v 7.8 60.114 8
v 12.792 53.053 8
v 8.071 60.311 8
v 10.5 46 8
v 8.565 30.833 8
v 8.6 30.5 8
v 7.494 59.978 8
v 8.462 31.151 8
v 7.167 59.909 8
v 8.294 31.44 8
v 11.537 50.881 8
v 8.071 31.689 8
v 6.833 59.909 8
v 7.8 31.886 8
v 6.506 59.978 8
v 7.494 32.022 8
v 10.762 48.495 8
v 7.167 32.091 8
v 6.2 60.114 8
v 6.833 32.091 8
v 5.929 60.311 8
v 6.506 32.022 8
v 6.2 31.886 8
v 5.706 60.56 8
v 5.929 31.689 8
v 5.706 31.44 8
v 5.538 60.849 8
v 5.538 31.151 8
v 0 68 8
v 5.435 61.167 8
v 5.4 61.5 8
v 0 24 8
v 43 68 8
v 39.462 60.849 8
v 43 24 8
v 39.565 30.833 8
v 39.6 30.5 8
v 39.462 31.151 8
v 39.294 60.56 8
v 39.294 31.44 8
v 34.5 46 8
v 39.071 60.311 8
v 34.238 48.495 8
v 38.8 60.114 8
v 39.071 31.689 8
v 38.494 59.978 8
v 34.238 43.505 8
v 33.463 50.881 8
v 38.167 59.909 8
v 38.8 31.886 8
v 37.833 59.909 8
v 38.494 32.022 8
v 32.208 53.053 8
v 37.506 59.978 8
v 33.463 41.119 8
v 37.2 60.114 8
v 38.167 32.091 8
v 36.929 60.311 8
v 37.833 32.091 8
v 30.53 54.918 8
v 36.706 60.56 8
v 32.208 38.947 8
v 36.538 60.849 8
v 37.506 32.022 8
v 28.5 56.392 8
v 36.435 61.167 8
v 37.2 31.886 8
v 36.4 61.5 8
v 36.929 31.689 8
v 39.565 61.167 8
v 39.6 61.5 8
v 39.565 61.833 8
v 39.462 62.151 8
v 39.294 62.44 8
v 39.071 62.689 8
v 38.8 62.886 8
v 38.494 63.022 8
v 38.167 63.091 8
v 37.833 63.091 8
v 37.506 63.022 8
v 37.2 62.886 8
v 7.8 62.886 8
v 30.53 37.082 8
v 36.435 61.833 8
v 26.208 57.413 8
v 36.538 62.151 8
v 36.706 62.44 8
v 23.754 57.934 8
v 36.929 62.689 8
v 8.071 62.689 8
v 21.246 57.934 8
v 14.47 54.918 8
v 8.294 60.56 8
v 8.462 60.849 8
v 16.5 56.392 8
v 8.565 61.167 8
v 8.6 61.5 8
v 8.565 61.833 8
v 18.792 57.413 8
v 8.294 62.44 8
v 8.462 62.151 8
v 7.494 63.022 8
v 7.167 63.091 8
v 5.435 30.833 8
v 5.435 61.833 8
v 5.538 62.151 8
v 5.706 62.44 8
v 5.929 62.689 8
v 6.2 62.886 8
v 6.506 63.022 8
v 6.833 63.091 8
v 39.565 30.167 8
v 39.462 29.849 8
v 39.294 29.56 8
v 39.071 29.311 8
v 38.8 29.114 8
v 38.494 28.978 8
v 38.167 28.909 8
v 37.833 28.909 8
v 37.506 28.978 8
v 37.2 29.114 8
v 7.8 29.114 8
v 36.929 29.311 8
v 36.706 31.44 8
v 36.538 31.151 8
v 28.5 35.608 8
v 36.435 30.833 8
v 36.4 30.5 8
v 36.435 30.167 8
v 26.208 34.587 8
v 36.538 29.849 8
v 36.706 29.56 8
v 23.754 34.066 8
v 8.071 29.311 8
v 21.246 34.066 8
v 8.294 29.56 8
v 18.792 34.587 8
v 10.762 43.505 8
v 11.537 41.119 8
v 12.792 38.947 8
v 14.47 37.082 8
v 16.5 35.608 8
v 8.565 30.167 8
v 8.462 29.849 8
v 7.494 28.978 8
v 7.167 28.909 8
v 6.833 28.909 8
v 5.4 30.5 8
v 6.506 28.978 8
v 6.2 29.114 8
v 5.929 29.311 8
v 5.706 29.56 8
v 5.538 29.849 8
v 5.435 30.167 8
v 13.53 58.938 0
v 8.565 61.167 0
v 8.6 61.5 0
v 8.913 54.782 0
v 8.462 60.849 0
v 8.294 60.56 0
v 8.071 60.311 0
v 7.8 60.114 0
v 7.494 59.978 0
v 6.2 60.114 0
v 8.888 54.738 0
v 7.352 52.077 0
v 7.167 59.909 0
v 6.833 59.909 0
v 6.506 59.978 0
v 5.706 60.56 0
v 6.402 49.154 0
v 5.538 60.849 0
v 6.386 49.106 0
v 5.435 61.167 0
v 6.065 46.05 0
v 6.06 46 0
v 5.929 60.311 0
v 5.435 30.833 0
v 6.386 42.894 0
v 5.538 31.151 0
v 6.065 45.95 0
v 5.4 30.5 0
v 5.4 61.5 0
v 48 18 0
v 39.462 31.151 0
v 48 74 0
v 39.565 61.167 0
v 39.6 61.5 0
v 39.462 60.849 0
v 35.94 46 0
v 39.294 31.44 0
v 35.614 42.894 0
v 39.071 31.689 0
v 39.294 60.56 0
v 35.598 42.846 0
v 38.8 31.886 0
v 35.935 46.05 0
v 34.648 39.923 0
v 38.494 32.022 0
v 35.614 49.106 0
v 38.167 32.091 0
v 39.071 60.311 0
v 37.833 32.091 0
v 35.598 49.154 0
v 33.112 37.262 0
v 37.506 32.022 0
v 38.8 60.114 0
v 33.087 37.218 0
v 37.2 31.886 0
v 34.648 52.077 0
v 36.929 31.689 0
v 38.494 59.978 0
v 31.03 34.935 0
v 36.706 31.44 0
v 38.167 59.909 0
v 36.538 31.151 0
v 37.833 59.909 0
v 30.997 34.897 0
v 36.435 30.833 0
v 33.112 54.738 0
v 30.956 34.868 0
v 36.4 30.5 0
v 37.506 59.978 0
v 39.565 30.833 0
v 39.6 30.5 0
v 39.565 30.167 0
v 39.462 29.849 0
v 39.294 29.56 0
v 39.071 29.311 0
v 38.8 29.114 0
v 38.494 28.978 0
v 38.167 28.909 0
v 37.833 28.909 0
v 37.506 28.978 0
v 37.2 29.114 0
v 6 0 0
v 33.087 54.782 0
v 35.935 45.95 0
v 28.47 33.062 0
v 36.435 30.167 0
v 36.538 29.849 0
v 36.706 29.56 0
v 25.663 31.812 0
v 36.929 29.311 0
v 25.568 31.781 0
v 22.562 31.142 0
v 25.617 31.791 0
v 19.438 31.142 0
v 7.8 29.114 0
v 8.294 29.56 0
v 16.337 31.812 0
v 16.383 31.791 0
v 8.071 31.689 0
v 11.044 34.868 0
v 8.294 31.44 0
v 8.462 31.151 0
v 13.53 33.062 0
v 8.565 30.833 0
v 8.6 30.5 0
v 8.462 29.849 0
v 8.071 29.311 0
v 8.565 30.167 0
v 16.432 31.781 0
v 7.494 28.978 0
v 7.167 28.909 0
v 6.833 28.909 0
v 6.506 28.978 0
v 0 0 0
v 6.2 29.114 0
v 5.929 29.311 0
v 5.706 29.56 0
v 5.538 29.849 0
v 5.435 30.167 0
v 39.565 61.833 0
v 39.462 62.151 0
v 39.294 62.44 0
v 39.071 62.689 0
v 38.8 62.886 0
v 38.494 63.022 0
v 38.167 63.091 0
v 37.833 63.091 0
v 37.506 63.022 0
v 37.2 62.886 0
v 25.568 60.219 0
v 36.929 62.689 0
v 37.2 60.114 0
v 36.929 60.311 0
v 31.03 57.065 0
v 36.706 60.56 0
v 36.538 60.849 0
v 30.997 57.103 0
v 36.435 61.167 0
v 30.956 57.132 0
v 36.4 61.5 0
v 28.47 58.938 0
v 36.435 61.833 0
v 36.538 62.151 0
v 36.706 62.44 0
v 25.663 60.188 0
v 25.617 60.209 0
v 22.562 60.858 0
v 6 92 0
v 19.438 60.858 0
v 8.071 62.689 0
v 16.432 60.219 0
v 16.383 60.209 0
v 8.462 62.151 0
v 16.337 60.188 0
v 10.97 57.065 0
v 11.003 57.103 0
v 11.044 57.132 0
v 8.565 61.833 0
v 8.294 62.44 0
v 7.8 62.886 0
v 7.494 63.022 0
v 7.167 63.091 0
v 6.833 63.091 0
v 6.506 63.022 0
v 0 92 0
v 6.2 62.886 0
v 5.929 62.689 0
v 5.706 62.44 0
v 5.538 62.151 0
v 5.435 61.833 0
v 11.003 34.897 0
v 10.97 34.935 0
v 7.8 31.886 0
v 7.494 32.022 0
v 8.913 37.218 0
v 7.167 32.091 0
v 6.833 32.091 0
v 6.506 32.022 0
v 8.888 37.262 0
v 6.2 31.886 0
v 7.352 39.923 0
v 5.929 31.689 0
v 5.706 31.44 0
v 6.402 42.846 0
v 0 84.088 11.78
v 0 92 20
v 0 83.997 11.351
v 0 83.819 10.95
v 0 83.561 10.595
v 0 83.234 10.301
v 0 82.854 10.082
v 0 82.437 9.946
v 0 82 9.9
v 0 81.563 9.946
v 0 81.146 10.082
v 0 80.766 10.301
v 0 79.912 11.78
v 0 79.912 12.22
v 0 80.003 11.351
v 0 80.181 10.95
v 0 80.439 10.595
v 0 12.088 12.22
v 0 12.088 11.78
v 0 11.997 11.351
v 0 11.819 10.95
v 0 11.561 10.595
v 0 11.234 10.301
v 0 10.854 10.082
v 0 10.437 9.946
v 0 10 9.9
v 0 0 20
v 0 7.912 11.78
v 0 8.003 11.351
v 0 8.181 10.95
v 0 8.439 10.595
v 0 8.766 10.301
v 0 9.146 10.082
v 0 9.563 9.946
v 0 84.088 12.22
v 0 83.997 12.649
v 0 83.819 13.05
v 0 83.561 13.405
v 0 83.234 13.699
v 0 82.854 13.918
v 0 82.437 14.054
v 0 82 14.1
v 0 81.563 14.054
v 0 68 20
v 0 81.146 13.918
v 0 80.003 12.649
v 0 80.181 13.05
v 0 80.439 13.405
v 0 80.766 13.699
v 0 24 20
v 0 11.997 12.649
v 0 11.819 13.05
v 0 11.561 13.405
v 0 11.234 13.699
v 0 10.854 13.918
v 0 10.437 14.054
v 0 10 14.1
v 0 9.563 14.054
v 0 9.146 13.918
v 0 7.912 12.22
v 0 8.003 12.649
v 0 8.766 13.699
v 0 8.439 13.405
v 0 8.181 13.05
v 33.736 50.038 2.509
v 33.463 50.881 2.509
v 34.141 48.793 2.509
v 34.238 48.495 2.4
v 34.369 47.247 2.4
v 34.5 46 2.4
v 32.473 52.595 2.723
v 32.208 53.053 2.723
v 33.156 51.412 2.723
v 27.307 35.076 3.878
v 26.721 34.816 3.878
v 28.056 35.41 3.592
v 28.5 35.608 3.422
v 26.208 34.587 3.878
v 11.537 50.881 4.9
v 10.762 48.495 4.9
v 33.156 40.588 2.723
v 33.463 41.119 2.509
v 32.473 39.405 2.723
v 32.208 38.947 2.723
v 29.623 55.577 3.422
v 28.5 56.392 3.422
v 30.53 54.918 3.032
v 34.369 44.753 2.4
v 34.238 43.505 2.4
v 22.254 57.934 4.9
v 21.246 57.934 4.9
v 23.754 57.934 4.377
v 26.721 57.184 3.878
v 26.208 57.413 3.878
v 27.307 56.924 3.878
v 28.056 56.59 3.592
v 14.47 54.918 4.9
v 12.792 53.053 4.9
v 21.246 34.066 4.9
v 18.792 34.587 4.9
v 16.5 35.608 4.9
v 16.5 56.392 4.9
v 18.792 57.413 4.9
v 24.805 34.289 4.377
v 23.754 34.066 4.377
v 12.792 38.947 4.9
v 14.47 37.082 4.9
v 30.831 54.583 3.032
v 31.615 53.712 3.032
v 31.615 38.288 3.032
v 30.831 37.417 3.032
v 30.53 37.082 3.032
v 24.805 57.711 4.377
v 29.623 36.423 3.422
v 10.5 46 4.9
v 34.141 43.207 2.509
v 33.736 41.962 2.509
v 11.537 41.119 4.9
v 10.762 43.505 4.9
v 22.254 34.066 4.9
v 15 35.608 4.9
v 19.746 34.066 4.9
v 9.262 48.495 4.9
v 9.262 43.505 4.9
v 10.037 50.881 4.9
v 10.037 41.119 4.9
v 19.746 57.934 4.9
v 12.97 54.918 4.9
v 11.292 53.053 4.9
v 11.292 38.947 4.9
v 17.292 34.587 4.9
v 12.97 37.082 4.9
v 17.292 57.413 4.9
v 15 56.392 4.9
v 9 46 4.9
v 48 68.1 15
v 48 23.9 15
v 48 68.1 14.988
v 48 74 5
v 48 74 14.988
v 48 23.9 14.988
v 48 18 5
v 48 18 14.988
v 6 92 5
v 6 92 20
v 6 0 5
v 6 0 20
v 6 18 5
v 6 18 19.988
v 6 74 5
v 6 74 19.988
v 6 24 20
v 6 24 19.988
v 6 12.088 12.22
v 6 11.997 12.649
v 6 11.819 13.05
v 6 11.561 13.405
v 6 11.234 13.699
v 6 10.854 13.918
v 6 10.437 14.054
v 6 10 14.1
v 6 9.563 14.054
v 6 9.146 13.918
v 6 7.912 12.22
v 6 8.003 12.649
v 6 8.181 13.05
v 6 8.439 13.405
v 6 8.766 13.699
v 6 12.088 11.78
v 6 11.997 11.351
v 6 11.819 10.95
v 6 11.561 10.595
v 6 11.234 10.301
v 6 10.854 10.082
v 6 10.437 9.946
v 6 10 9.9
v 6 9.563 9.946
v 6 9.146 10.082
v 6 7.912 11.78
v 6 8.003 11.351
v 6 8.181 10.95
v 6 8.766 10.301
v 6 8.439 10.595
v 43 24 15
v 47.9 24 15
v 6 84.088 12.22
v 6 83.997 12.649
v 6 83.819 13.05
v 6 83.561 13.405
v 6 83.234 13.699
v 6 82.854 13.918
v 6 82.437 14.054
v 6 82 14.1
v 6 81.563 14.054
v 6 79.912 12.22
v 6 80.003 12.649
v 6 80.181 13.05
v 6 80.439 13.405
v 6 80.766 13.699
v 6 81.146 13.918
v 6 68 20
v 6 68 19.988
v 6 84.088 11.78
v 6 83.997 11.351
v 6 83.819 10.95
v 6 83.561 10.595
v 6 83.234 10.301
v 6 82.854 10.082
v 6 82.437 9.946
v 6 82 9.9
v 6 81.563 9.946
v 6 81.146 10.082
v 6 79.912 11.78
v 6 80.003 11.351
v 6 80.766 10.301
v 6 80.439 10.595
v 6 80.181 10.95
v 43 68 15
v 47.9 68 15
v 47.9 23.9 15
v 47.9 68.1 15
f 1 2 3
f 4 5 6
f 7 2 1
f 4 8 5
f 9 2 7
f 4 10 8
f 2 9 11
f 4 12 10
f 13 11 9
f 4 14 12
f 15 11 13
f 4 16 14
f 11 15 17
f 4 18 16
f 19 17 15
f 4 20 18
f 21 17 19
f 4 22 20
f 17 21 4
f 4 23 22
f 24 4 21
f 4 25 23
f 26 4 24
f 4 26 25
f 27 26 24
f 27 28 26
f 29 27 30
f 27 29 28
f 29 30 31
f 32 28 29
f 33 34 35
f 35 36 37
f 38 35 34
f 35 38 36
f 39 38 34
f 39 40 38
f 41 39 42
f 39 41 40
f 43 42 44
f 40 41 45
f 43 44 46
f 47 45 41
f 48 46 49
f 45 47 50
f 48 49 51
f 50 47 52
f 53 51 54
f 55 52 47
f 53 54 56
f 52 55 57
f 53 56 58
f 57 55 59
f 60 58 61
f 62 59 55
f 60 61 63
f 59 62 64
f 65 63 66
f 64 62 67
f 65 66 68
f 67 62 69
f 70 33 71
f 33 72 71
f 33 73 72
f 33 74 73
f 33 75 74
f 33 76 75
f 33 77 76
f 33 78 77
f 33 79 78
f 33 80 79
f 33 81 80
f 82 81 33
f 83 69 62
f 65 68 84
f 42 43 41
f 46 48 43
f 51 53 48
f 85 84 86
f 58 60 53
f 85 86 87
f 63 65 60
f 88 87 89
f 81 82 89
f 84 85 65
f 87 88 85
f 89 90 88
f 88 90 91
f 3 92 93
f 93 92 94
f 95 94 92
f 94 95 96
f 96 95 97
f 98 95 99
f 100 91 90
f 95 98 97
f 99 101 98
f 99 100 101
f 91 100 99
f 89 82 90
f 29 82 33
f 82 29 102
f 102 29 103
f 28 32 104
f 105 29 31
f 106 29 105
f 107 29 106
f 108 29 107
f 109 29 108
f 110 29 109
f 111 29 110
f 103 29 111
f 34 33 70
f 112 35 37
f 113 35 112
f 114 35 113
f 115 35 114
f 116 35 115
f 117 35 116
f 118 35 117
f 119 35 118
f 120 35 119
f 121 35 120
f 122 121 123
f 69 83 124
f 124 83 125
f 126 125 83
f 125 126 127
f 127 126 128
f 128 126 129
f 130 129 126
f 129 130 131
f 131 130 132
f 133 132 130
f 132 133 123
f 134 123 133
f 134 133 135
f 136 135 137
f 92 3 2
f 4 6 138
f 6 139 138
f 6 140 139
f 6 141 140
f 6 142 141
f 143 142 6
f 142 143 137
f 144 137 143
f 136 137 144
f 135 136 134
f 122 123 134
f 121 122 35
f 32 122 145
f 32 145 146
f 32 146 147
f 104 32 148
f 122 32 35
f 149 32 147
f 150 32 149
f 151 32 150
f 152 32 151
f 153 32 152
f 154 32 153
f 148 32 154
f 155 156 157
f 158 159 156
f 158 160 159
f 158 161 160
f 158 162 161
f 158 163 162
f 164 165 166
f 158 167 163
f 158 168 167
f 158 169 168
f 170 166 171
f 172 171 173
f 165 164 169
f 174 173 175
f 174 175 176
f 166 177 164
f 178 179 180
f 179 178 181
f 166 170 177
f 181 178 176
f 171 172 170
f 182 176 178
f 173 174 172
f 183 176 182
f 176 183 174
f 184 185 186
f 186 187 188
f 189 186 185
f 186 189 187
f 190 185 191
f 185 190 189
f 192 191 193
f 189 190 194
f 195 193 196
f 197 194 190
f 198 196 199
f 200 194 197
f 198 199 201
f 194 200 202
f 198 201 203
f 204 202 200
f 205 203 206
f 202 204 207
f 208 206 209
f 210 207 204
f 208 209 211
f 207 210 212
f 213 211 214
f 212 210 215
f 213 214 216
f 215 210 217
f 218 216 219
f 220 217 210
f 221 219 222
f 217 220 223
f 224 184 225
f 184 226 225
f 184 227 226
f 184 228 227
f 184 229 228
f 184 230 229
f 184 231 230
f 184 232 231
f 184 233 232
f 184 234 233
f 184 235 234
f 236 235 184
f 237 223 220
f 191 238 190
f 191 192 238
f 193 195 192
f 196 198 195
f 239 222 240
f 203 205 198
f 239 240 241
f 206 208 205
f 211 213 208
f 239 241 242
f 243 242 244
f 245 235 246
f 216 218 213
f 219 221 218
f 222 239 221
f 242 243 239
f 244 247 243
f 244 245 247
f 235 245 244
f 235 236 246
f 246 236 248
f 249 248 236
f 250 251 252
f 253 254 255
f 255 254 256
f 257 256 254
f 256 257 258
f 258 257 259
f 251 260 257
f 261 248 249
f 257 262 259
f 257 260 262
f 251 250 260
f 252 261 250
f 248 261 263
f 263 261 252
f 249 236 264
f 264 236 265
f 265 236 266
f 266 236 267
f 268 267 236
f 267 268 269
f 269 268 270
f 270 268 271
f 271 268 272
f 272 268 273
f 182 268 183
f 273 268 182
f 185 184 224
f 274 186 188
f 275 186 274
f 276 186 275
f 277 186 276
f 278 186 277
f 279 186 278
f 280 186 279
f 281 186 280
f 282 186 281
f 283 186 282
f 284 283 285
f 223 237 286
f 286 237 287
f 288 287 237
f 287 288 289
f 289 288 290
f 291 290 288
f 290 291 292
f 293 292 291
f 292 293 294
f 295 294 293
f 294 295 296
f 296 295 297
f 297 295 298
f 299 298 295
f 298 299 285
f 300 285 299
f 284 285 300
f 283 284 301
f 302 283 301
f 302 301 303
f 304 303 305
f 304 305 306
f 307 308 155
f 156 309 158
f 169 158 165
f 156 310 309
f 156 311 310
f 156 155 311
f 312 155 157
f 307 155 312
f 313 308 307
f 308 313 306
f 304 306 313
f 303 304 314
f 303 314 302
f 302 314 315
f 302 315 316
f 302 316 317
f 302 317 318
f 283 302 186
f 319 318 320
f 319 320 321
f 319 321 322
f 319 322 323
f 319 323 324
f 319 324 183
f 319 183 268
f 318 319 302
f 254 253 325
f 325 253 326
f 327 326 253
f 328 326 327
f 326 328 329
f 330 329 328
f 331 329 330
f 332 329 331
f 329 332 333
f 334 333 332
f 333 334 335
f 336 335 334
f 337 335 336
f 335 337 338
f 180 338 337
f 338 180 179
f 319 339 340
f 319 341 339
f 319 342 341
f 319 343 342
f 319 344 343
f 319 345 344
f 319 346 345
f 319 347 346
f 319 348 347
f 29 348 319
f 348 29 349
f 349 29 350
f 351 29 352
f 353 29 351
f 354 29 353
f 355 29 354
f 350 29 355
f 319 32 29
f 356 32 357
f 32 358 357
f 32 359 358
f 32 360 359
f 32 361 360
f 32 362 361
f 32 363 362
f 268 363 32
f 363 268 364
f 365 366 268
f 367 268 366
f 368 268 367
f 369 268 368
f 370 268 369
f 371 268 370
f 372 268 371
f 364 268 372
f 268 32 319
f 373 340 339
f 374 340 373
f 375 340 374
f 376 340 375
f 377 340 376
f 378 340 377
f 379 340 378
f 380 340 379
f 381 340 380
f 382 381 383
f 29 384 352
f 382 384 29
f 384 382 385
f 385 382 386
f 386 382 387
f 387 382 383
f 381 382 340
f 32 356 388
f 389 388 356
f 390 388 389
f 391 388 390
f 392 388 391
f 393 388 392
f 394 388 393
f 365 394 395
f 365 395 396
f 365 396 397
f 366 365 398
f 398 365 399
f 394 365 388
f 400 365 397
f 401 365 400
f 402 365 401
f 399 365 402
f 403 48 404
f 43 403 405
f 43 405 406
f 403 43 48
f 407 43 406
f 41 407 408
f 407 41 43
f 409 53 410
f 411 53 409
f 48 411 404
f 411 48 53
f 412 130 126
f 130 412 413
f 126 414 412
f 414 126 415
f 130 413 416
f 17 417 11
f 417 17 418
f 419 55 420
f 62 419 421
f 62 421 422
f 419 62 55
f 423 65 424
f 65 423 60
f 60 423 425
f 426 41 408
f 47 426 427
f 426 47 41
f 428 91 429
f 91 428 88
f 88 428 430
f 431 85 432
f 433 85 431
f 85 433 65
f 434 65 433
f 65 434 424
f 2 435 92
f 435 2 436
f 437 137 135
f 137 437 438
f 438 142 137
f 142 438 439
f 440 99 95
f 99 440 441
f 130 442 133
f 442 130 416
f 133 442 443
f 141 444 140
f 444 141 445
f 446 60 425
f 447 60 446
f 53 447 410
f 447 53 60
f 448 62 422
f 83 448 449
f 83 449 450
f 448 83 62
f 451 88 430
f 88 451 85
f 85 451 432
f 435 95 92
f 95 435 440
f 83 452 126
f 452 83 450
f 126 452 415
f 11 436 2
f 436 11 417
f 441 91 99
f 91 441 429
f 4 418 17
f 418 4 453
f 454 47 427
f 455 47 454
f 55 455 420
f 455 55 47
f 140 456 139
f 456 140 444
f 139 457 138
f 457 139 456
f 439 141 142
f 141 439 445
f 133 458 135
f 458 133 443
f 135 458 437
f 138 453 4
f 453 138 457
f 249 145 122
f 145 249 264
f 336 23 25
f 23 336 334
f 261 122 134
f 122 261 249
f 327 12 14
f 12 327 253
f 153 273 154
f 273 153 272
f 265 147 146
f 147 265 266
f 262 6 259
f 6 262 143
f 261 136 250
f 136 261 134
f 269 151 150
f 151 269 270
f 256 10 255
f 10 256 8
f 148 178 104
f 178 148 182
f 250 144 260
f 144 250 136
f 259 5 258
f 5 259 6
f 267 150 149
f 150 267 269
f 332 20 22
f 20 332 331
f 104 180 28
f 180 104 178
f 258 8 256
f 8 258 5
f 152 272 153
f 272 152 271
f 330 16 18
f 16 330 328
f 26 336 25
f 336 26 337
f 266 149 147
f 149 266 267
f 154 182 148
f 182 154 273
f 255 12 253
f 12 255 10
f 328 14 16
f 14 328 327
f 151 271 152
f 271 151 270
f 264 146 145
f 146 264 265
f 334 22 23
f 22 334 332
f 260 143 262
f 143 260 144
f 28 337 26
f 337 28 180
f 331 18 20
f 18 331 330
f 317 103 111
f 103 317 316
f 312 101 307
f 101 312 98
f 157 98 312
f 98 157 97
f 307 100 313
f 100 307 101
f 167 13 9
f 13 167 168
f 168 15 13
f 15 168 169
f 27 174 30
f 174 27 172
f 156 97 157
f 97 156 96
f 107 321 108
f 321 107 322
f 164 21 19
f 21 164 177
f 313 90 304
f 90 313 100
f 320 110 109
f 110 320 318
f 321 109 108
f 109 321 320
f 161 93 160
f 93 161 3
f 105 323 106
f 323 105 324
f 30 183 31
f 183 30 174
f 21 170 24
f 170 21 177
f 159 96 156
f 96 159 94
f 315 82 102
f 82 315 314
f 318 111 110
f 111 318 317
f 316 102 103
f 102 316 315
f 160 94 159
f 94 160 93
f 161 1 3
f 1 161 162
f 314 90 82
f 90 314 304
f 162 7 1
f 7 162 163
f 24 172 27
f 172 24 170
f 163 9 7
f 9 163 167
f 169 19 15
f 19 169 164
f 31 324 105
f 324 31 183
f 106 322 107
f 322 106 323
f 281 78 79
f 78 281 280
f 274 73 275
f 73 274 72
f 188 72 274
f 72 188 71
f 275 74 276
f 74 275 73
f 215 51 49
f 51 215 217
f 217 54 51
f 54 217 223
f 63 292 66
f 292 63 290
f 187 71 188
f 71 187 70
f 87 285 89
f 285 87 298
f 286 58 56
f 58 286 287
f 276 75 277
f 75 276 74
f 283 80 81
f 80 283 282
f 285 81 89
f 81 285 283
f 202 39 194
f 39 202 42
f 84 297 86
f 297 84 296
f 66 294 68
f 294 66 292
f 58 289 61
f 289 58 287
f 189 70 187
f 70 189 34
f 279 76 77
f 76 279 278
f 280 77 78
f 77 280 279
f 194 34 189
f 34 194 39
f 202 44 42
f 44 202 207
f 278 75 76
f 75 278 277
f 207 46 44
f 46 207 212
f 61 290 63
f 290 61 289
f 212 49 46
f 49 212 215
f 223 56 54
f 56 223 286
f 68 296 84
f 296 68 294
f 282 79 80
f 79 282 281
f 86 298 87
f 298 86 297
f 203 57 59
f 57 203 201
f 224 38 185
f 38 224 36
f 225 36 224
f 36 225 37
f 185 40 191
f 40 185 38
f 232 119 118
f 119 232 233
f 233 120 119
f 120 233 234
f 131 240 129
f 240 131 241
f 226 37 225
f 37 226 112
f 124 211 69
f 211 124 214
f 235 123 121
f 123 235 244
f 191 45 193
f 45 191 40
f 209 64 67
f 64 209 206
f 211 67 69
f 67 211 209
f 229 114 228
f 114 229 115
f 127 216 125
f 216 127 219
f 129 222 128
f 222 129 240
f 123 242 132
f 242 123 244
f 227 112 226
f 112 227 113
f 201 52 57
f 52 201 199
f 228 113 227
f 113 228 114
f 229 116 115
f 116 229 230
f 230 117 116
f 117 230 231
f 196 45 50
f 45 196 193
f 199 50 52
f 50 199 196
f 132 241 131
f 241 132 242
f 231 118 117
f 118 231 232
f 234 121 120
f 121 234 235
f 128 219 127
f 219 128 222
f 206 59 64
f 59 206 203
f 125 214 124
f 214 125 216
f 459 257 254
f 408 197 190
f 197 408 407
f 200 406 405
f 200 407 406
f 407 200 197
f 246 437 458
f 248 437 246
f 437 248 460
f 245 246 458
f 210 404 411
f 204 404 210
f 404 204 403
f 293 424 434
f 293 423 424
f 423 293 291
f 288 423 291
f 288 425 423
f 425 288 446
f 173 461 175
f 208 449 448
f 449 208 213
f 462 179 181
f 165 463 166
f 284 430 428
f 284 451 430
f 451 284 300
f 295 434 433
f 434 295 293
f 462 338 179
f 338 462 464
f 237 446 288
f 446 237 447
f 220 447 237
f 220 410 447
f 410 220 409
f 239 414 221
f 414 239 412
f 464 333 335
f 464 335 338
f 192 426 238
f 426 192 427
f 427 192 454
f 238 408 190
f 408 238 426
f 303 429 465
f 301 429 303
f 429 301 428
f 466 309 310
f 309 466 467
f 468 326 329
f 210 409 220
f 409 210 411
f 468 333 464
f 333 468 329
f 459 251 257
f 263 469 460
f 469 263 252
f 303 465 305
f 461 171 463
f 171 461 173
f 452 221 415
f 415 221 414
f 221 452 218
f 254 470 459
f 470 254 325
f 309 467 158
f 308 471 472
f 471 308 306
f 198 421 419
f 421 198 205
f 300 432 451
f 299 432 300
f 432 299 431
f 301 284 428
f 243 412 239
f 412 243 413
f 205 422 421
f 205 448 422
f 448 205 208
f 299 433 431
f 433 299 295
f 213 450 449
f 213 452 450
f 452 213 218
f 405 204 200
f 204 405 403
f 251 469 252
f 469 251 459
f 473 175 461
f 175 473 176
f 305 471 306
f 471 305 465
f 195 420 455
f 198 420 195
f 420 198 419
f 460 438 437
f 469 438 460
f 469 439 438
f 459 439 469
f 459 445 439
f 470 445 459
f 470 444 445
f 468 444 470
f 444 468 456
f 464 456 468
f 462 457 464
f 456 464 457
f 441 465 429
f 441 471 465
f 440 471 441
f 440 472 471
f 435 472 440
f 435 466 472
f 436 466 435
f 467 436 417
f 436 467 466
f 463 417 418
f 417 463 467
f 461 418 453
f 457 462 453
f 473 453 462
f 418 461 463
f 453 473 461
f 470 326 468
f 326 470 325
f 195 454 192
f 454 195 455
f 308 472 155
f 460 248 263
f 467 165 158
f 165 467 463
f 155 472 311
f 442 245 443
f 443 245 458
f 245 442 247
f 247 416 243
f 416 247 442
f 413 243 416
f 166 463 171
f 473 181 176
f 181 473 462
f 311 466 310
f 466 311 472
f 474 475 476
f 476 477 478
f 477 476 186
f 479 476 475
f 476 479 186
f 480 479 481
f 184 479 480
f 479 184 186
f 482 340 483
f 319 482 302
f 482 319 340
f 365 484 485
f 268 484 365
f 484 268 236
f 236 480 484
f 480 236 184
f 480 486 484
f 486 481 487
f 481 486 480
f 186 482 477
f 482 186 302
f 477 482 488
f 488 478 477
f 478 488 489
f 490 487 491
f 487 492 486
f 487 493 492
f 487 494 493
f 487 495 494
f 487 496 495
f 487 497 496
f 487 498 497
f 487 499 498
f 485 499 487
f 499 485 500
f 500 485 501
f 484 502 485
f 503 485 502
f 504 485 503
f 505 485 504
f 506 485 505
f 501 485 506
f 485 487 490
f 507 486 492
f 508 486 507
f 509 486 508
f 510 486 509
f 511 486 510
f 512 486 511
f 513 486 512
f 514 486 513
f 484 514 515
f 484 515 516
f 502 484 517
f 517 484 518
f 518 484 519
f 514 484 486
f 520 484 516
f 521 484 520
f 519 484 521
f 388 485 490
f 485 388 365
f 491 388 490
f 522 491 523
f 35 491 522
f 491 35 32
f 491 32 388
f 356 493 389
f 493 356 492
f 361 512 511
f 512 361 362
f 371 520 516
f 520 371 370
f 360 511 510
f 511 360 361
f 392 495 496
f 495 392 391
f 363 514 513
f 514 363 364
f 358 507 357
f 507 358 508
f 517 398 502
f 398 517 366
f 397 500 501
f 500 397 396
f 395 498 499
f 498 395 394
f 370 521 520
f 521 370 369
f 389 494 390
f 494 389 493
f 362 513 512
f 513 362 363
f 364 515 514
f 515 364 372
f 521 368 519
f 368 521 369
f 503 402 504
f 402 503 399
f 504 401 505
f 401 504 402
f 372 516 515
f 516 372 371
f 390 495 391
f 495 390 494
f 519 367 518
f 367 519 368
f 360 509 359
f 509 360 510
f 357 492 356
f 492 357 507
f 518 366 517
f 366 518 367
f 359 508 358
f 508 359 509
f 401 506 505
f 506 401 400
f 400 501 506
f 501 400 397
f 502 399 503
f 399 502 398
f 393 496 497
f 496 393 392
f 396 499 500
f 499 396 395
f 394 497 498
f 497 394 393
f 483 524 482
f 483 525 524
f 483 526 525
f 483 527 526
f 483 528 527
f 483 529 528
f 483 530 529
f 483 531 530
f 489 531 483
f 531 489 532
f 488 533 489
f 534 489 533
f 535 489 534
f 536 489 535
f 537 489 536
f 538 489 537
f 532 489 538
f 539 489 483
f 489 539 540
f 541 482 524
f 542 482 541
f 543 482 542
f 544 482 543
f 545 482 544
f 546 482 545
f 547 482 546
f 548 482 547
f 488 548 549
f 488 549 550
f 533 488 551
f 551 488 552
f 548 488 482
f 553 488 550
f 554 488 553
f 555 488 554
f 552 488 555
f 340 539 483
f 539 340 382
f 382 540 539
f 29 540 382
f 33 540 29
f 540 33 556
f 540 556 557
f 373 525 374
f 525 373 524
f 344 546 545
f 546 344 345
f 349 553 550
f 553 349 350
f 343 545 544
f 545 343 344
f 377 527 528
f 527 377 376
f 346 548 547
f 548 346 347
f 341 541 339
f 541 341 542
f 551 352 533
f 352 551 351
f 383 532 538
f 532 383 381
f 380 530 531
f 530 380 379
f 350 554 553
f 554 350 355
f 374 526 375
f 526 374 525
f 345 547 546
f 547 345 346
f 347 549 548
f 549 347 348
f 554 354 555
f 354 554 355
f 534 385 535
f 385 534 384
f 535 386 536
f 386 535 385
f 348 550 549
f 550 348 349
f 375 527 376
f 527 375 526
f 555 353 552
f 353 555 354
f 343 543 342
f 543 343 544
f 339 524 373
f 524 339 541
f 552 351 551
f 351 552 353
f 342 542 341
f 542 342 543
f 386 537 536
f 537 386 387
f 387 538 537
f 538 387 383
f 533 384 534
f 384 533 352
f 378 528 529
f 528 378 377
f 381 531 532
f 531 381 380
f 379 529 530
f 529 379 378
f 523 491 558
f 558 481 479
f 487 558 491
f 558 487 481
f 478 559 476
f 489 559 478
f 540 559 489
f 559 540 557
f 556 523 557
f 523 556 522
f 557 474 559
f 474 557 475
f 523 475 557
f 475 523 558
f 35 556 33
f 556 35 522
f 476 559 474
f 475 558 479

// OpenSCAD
// file: functions.scad
// PRUSA Mendel  
// Functions used in many files
// GNU GPL v2
// Josef Průša
// josefprusa@me.com
// prusadjs.cz
// http://www.reprap.org/wiki/Prusa_Mendel
// http://github.com/prusajr/PrusaMendel

module nut(d,h,horizontal=true){
cornerdiameter =  (d / 2) / cos (180 / 6);
cylinder(h = h, r = cornerdiameter, $fn = 6);
if(horizontal){
for(i = [1:6]){
	rotate([0,0,60*i]) translate([-cornerdiameter-0.2,0,0]) rotate([0,0,-45]) cube(size = [2,2,h]);
}}
}

// By nophead
module polyhole(d,h) {
    n = max(round(2 * d),3);
    rotate([0,0,180])
        cylinder(h = h, r = (d / 2) / cos (180 / n), $fn = n);
}

module roundcorner(diameter){
	difference(){
		cube(size = [diameter,diameter,99], center = false);
		translate(v = [diameter, diameter, 0]) cylinder(h = 100, r=diameter, center=true);
	}
}
// file: metric.scad
// PRUSA Mendel  
// Default metric sizes
// GNU GPL v2
// Josef Průša
// josefprusa@me.com
// prusadjs.cz
// http://www.reprap.org/wiki/Prusa_Mendel
// http://github.com/prusajr/PrusaMendel

// DONT CHANGE THIS FILE! ALTER VALUES IN CONFIGURATION.SCAD INSTEAD

// RODS

threaded_rod_diameter = 8;
threaded_rod_diameter_horizontal = 8;
smooth_bar_diameter = 8;
smooth_bar_diameter_horizontal = 8;

// Nuts and bolts

m8_diameter = 8;
m8_nut_diameter = 14.5;

m4_diameter = 4;
m4_nut_diameter = 7.5;

m3_diameter = 3;
m3_nut_diameter = 5;

// Bushing holder

bushing_core_diameter = smooth_bar_diameter;
bushing_material_thickness = 1;

// Motors

motor_shaft = 5.1;
// file: y-motor-bracket-univy.scad
// C. Strang		
// cstrang@????
// funfor.us
// f. beachler
// longevity software d.b.a. terawatt industries

include <metric.scad>;

h = 5;   	// base thickness
hh=6;
o = 0.1;	//  overlap amount
w=2.5;			// wall thickness
fmp = true;	// four mount points
st=2;

m3=m3_diameter + 0.2; 
m4=m4_diameter + 0.2; 
m8 = smooth_bar_diameter_horizontal;

$fn=30;

translate([0,0,0]) ymotormount();

module ymotormount()
{
	translate([0, 5, 0]) rotate([0, 0, 0]) nema17motormount(h,fmp);
	translate([0, 10, 0]) rotate([0,0,0]) walls();
}


module nema17motormount(pt, mp)
{
	difference()
	{
		union()
		{
			difference()
			{
				translate([-1.5, -5, 0]) rotate([0,0,0]) cube([42 + 3, 47, pt]);
		
				translate([21,21,-0.1]) cylinder(r=12,h=pt+2*o);
				if (mp==false)
				{
					translate([28,-0.1,-o])  cube([25,30,21]);
					translate([3,-0.1,-o])  cube([36,15,21]);
				} else {
					translate([55, -15, -o]) rotate([0, 0, 120]) cube([20, 20, 10]);
				}
		
			}
			
			if (mp==false) difference()
			{
				translate([35.6,32.6,0]) cylinder(r=7.3,h=pt);
				translate([42,28,-o]) cube([5,10,pt+2*o]);
				translate([28,30,-o]) cube([17,10,pt+2*o]);
			}
		
			if (mp==false) translate([1,0,0]) difference()
			{
				translate([2.6,9.3,0]) cylinder(r=9.3,h=pt);
				translate([-8,0,-o]) cube([7,20,pt+2*o]);
			}
		}
		translate([5.5,5.5,-o]) cylinder(r=m3/2,h=pt+2*o);
		translate([5.5,36.5,-o]) cylinder(r=m3/2,h=pt+2*o);
		translate([36.5,36.5,-o]) cylinder(r=m3/2,h=pt+2*o);
		if (mp==true)
		{
			translate([36.5,5.5,-o]) cylinder(r=m3/2,h=pt+2*o);
	
		}
	}
}


module walls()
{
	// fill-in space between bottom wall and nema mount
	//translate([0,0,0]) rotate([0,0,0]) cube([30, 42, 5]);
	// nema mount wall
	difference()
	{
			translate([42, 0, 0]) rotate([0,0,0]) cube([h+o, 42, 20]);
			translate([-o + 42, 0, h]) rotate([atan(20/42),0,0]) cube([h+3*o, 47, 25]);
	}
	// support between bottom and nema mount walls
	translate([47, 37, 0]) rotate([0, 0, 90]) cube([h + o, 52,20]);
	// bottom wall
	difference()
	{
			translate([-5, 0, 0]) rotate([0,0,0]) cube([h+o, 42, 20]);
			translate([-o - 5, 0, h]) rotate([atan(20/42),0,0]) cube([h+3*o, 47, 25]);
	}
	// extrusion wall
	difference()
	{
			translate([h,42,0]) rotate([0,0,0]) cube([hh,20,20]);
			translate([h-o,62,12.5]) rotate([atan(1),0,0]) cube([hh+2*o,20,25]);
			translate([h - o, 54, 12]) rotate([0,90,0]) cylinder(r = m4 / 2 , h = hh * 2 + 2*o);
	}
	// extrusion wall support
	difference()
	{
			translate([-h, 42, 0]) rotate([0,0,0]) cube([16,20,h]);
			translate([-h - 8.7, 52, -o]) rotate([0,0,-atan(10/15)]) mirror([0,0,0]) cube([10,20,h+3*o]);
	}
	difference()
	{
			translate([-h, 42, 0]) rotate([0, 0, 0]) cube([16, h, 20]);
			translate([-h - 14, 42 - o, h + 8 + o]) rotate([0, atan(10/15), 0]) mirror([0,0,0]) cube([16,h+3*o,20]);
	}
	// extrusion wall support
	difference()
	{
			translate([31,42,0]) rotate([0,0,0]) cube([16,20,h]);
			translate([47,47,-o]) rotate([0,0,atan(10/15)]) mirror([0,0,0]) cube([10,20,h+3*o]);
	}
	// extrusion wall
	difference()
	{
			translate([31,42,0]) rotate([0,0,0]) cube([hh,20,20]);
			translate([31-o,62,12.5]) rotate([atan(1),0,0]) cube([hh+2*o,20,25]);
			// m4 screw hole
			translate([31 - o, 54, 12]) rotate([0,90,0]) cylinder(r = m4 / 2, h = hh * 2 + 2*o);
	}
	// extrusion wall support
	difference()
	{
			translate([31,42,0]) rotate([0,0,0]) cube([16,h,20]);
			translate([47,42-o,h]) rotate([0,-atan(10/15),0]) mirror([0,0,0]) cube([16,h+3*o,20]);
	}
	// t-slot guide
	translate([18.5,42,0]) rotate([0,0,0]) cube([5, st, h + 15]);
}
// file: configuration.scad
// PRUSA Mendel  
// Configuration file
// GNU GPL v2
// Josef Průša
// josefprusa@me.com
// prusadjs.cz
// http://www.reprap.org/wiki/Prusa_Mendel
// http://github.com/prusajr/PrusaMendel

// PLEASE SELECT ONE OF THE CONFIGURATIONS BELOW
// BY UN-COMMENTING IT

// Uncomment for metric settings
// METRIC METRIC METRIC METRIC METRIC METRIC METRIC METRIC 

include <metric.scad>;

// Uncomment for imperial settings
// IMPERIAL IMPERIAL IMPERIAL IMPERIAL IMPERIAL IMPERIAL IMPERIAL 

//include <sae.scad>;

//thin_wall = 3;
// LM8UU
//linear = false;

// override settings by customizing below
// CUSTOM CUSTOM CUSTOM CUSTOM CUSTOM CUSTOM CUSTOM CUSTOM CUSTOM

threaded_rod_diameter = 8.2;
threaded_rod_diameter_horizontal = 8.2;
smooth_bar_diameter = 8.3;
smooth_bar_diameter_horizontal = 8.3;

// Nuts and bolts

m8_diameter = 8.3;
m8_nut_diameter = 15;

m4_diameter = 4.2;
m4_nut_diameter = 9;

m3_diameter = 3.3;
m3_nut_diameter = 5.8;

///counted stuff
m3_nut_diameter_bigger = ((m3_nut_diameter  / 2) / cos (180 / 6))*2;

// functions 
include <functions.scad>
// main file
// C. Strang		
// cstrang@????
// funfor.us
// f. beachler
// longevity software d.b.a. terawatt industries


include <configuration.scad>;
use <y-motor-bracket-univy.scad>;

h = 8;   	// base thickness
o = 0.1;	//  overlap amount
w=6;			// wall thickness
fmp = true;	// four mount points

m3 = m3_diameter; 
m4 = m4_diameter; 
m8 = smooth_bar_diameter_horizontal;

$fn=30;

translate([0,0,0]) zmotorbracket(h,fmp,w);



module zmotorbracket(zbh, zbf, zbw)
{
	difference()
	{
		translate([1.5,25,0]) nema17motormount(zbh,zbf);
		translate([21,46,-o]) cylinder(r1=15,r2=12,h=5);
	}
	translate([0,0,0]) rotate([0,0,0]) zmountwalls(zbh,zbw);
}



module zmountwalls(zwh, zww)
{
	difference()
	{
		cube([42+zww,42+2*24+2,zwh]);
		translate([-o,25+o,-o]) cube([42+o,42-2*o,zwh+3*o]);

		translate([zww,0,-o]) rotate([0,0,atan((24-zww)/(42))]) mirror([0,1,0]) cube([42+1+zww,25-zww,zwh+2*o]);
		translate([-o,-o,5]) cube([42+zww+2*o,24-zww+o,4]);

		translate([zww,42+2*24+2,-o]) rotate([0,0,-atan((24-zww)/(42))]) mirror([0,0,0]) cube([42+1+zww,25-zww,zwh+2*o]);
		translate([-o,42+24+2+zww,5]) cube([42+zww+2*o,24-zww+o,4]);
	}

	difference()
	{
		cube([zww,24,20]);
		translate([-o,10,12]) rotate([0,90,0]) cylinder(r=m4/2,h=zww+2*o);
	}
	translate([0,68,0]) difference()
	{
		cube([zww,24,20]);
		translate([-o,14,12]) rotate([0,90,0]) cylinder(r=m4/2,h=zww+2*o);
	}

	translate([43,24-o,zwh-o]) cube([zww-1,44+2*o,7+o]);

	difference()
	{
		union()
		{
			translate([zww-o,24-zww,5]) cube([42+o,zww,15]);
			translate([zww-o,68,5]) cube([42+o,zww,15]);
		}
		translate([zww-o,24-zww-o,20]) rotate([0,atan(5/42),0]) cube([46,58,6]);
	}

}
